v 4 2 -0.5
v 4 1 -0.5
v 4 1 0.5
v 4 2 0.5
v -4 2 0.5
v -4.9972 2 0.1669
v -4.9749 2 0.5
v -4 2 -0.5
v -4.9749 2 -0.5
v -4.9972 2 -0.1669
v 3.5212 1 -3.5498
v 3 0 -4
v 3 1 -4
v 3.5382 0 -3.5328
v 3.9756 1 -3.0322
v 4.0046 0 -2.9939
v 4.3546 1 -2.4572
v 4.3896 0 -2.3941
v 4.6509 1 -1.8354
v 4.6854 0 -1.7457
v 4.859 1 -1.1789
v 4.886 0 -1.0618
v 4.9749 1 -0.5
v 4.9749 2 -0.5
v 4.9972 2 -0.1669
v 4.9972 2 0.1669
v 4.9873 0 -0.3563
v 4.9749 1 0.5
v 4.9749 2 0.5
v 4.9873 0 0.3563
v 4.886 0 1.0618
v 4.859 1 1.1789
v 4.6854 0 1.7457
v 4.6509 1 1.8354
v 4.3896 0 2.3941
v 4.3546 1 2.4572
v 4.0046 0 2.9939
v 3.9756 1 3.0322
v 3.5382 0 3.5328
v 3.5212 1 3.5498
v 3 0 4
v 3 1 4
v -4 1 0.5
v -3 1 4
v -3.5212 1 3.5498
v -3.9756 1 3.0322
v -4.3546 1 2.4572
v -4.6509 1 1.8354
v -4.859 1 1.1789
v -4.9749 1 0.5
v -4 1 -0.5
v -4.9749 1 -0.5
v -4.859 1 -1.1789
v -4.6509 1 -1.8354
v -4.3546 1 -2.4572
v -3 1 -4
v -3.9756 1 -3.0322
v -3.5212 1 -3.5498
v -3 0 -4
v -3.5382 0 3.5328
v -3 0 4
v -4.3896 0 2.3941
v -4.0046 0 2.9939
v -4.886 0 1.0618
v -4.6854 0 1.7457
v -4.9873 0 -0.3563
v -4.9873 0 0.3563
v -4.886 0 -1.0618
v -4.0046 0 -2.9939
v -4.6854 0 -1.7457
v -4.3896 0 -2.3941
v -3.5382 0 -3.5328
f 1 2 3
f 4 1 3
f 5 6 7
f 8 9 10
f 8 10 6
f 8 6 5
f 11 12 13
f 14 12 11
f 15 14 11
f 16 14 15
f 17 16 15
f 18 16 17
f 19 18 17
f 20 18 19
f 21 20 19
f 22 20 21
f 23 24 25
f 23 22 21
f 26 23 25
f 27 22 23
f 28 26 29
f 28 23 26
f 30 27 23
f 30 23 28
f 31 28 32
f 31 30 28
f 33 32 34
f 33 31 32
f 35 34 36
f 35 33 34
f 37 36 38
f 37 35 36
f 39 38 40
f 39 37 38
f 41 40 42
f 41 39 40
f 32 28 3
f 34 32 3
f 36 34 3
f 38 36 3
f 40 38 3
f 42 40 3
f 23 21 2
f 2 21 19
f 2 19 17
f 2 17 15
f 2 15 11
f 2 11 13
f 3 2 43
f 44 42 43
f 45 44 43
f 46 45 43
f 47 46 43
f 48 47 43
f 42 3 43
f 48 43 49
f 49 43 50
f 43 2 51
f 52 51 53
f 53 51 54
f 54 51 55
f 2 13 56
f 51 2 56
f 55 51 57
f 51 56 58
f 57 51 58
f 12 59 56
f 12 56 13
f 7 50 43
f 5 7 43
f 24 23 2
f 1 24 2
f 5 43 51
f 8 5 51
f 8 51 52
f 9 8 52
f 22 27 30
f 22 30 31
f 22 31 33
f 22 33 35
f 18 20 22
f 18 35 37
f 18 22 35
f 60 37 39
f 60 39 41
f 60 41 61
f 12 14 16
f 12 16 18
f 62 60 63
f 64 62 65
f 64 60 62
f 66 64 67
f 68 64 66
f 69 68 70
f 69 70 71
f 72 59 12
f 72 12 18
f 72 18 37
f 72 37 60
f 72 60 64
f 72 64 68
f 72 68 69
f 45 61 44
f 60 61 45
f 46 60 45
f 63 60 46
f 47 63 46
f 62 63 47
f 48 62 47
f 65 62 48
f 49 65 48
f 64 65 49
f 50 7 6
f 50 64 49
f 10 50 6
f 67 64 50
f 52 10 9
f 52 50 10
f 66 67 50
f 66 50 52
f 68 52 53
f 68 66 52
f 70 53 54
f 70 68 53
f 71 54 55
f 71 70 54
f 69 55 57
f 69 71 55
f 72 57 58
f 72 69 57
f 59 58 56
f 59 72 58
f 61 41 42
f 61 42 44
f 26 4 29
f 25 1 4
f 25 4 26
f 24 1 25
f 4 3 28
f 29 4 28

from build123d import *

# Parameters (mm, degrees)
BOSS_EXTRUDE1_DEPTH = 1
BOSS_EXTRUDE2_DEPTH = 1


with BuildPart() as part:
    # Sketch1 → Boss-Extrude1 (new body)
    with BuildSketch(Plane(origin=(0, 0, 0), x_dir=(1, 0, 0), z_dir=(0, 1, 0))):
        with BuildLine():
            Line((-3, 4), (3, 4))
            ThreePointArc((3, 4), (5, 0), (3, -4))
            Line((3, -4), (-3, -4))
            ThreePointArc((-3, -4), (-5, 0), (-3, 4))
        make_face()
    extrude(amount=BOSS_EXTRUDE1_DEPTH)

    # Sketch2 → Boss-Extrude2 (add)
    with BuildSketch(Plane(origin=(0, 1, 0), x_dir=(1, 0, 0), z_dir=(0, 1, 0))):
        with BuildLine():
            Line((4, 0.5), (4, -0.5))
            Line((4, -0.5), (4.974937186, -0.5))
            ThreePointArc((4.974937186, -0.5), (5, 0), (4.974937186, 0.5))
            Line((4.974937186, 0.5), (4, 0.5))
        make_face()
        with BuildLine():
            Line((-4, -0.5), (-4, 0.5))
            Line((-4, 0.5), (-4.974937186, 0.5))
            ThreePointArc((-4.974937186, 0.5), (-5, 0), (-4.974937186, -0.5))
            Line((-4.974937186, -0.5), (-4, -0.5))
        make_face()
    extrude(amount=BOSS_EXTRUDE2_DEPTH)


solid = part.part
